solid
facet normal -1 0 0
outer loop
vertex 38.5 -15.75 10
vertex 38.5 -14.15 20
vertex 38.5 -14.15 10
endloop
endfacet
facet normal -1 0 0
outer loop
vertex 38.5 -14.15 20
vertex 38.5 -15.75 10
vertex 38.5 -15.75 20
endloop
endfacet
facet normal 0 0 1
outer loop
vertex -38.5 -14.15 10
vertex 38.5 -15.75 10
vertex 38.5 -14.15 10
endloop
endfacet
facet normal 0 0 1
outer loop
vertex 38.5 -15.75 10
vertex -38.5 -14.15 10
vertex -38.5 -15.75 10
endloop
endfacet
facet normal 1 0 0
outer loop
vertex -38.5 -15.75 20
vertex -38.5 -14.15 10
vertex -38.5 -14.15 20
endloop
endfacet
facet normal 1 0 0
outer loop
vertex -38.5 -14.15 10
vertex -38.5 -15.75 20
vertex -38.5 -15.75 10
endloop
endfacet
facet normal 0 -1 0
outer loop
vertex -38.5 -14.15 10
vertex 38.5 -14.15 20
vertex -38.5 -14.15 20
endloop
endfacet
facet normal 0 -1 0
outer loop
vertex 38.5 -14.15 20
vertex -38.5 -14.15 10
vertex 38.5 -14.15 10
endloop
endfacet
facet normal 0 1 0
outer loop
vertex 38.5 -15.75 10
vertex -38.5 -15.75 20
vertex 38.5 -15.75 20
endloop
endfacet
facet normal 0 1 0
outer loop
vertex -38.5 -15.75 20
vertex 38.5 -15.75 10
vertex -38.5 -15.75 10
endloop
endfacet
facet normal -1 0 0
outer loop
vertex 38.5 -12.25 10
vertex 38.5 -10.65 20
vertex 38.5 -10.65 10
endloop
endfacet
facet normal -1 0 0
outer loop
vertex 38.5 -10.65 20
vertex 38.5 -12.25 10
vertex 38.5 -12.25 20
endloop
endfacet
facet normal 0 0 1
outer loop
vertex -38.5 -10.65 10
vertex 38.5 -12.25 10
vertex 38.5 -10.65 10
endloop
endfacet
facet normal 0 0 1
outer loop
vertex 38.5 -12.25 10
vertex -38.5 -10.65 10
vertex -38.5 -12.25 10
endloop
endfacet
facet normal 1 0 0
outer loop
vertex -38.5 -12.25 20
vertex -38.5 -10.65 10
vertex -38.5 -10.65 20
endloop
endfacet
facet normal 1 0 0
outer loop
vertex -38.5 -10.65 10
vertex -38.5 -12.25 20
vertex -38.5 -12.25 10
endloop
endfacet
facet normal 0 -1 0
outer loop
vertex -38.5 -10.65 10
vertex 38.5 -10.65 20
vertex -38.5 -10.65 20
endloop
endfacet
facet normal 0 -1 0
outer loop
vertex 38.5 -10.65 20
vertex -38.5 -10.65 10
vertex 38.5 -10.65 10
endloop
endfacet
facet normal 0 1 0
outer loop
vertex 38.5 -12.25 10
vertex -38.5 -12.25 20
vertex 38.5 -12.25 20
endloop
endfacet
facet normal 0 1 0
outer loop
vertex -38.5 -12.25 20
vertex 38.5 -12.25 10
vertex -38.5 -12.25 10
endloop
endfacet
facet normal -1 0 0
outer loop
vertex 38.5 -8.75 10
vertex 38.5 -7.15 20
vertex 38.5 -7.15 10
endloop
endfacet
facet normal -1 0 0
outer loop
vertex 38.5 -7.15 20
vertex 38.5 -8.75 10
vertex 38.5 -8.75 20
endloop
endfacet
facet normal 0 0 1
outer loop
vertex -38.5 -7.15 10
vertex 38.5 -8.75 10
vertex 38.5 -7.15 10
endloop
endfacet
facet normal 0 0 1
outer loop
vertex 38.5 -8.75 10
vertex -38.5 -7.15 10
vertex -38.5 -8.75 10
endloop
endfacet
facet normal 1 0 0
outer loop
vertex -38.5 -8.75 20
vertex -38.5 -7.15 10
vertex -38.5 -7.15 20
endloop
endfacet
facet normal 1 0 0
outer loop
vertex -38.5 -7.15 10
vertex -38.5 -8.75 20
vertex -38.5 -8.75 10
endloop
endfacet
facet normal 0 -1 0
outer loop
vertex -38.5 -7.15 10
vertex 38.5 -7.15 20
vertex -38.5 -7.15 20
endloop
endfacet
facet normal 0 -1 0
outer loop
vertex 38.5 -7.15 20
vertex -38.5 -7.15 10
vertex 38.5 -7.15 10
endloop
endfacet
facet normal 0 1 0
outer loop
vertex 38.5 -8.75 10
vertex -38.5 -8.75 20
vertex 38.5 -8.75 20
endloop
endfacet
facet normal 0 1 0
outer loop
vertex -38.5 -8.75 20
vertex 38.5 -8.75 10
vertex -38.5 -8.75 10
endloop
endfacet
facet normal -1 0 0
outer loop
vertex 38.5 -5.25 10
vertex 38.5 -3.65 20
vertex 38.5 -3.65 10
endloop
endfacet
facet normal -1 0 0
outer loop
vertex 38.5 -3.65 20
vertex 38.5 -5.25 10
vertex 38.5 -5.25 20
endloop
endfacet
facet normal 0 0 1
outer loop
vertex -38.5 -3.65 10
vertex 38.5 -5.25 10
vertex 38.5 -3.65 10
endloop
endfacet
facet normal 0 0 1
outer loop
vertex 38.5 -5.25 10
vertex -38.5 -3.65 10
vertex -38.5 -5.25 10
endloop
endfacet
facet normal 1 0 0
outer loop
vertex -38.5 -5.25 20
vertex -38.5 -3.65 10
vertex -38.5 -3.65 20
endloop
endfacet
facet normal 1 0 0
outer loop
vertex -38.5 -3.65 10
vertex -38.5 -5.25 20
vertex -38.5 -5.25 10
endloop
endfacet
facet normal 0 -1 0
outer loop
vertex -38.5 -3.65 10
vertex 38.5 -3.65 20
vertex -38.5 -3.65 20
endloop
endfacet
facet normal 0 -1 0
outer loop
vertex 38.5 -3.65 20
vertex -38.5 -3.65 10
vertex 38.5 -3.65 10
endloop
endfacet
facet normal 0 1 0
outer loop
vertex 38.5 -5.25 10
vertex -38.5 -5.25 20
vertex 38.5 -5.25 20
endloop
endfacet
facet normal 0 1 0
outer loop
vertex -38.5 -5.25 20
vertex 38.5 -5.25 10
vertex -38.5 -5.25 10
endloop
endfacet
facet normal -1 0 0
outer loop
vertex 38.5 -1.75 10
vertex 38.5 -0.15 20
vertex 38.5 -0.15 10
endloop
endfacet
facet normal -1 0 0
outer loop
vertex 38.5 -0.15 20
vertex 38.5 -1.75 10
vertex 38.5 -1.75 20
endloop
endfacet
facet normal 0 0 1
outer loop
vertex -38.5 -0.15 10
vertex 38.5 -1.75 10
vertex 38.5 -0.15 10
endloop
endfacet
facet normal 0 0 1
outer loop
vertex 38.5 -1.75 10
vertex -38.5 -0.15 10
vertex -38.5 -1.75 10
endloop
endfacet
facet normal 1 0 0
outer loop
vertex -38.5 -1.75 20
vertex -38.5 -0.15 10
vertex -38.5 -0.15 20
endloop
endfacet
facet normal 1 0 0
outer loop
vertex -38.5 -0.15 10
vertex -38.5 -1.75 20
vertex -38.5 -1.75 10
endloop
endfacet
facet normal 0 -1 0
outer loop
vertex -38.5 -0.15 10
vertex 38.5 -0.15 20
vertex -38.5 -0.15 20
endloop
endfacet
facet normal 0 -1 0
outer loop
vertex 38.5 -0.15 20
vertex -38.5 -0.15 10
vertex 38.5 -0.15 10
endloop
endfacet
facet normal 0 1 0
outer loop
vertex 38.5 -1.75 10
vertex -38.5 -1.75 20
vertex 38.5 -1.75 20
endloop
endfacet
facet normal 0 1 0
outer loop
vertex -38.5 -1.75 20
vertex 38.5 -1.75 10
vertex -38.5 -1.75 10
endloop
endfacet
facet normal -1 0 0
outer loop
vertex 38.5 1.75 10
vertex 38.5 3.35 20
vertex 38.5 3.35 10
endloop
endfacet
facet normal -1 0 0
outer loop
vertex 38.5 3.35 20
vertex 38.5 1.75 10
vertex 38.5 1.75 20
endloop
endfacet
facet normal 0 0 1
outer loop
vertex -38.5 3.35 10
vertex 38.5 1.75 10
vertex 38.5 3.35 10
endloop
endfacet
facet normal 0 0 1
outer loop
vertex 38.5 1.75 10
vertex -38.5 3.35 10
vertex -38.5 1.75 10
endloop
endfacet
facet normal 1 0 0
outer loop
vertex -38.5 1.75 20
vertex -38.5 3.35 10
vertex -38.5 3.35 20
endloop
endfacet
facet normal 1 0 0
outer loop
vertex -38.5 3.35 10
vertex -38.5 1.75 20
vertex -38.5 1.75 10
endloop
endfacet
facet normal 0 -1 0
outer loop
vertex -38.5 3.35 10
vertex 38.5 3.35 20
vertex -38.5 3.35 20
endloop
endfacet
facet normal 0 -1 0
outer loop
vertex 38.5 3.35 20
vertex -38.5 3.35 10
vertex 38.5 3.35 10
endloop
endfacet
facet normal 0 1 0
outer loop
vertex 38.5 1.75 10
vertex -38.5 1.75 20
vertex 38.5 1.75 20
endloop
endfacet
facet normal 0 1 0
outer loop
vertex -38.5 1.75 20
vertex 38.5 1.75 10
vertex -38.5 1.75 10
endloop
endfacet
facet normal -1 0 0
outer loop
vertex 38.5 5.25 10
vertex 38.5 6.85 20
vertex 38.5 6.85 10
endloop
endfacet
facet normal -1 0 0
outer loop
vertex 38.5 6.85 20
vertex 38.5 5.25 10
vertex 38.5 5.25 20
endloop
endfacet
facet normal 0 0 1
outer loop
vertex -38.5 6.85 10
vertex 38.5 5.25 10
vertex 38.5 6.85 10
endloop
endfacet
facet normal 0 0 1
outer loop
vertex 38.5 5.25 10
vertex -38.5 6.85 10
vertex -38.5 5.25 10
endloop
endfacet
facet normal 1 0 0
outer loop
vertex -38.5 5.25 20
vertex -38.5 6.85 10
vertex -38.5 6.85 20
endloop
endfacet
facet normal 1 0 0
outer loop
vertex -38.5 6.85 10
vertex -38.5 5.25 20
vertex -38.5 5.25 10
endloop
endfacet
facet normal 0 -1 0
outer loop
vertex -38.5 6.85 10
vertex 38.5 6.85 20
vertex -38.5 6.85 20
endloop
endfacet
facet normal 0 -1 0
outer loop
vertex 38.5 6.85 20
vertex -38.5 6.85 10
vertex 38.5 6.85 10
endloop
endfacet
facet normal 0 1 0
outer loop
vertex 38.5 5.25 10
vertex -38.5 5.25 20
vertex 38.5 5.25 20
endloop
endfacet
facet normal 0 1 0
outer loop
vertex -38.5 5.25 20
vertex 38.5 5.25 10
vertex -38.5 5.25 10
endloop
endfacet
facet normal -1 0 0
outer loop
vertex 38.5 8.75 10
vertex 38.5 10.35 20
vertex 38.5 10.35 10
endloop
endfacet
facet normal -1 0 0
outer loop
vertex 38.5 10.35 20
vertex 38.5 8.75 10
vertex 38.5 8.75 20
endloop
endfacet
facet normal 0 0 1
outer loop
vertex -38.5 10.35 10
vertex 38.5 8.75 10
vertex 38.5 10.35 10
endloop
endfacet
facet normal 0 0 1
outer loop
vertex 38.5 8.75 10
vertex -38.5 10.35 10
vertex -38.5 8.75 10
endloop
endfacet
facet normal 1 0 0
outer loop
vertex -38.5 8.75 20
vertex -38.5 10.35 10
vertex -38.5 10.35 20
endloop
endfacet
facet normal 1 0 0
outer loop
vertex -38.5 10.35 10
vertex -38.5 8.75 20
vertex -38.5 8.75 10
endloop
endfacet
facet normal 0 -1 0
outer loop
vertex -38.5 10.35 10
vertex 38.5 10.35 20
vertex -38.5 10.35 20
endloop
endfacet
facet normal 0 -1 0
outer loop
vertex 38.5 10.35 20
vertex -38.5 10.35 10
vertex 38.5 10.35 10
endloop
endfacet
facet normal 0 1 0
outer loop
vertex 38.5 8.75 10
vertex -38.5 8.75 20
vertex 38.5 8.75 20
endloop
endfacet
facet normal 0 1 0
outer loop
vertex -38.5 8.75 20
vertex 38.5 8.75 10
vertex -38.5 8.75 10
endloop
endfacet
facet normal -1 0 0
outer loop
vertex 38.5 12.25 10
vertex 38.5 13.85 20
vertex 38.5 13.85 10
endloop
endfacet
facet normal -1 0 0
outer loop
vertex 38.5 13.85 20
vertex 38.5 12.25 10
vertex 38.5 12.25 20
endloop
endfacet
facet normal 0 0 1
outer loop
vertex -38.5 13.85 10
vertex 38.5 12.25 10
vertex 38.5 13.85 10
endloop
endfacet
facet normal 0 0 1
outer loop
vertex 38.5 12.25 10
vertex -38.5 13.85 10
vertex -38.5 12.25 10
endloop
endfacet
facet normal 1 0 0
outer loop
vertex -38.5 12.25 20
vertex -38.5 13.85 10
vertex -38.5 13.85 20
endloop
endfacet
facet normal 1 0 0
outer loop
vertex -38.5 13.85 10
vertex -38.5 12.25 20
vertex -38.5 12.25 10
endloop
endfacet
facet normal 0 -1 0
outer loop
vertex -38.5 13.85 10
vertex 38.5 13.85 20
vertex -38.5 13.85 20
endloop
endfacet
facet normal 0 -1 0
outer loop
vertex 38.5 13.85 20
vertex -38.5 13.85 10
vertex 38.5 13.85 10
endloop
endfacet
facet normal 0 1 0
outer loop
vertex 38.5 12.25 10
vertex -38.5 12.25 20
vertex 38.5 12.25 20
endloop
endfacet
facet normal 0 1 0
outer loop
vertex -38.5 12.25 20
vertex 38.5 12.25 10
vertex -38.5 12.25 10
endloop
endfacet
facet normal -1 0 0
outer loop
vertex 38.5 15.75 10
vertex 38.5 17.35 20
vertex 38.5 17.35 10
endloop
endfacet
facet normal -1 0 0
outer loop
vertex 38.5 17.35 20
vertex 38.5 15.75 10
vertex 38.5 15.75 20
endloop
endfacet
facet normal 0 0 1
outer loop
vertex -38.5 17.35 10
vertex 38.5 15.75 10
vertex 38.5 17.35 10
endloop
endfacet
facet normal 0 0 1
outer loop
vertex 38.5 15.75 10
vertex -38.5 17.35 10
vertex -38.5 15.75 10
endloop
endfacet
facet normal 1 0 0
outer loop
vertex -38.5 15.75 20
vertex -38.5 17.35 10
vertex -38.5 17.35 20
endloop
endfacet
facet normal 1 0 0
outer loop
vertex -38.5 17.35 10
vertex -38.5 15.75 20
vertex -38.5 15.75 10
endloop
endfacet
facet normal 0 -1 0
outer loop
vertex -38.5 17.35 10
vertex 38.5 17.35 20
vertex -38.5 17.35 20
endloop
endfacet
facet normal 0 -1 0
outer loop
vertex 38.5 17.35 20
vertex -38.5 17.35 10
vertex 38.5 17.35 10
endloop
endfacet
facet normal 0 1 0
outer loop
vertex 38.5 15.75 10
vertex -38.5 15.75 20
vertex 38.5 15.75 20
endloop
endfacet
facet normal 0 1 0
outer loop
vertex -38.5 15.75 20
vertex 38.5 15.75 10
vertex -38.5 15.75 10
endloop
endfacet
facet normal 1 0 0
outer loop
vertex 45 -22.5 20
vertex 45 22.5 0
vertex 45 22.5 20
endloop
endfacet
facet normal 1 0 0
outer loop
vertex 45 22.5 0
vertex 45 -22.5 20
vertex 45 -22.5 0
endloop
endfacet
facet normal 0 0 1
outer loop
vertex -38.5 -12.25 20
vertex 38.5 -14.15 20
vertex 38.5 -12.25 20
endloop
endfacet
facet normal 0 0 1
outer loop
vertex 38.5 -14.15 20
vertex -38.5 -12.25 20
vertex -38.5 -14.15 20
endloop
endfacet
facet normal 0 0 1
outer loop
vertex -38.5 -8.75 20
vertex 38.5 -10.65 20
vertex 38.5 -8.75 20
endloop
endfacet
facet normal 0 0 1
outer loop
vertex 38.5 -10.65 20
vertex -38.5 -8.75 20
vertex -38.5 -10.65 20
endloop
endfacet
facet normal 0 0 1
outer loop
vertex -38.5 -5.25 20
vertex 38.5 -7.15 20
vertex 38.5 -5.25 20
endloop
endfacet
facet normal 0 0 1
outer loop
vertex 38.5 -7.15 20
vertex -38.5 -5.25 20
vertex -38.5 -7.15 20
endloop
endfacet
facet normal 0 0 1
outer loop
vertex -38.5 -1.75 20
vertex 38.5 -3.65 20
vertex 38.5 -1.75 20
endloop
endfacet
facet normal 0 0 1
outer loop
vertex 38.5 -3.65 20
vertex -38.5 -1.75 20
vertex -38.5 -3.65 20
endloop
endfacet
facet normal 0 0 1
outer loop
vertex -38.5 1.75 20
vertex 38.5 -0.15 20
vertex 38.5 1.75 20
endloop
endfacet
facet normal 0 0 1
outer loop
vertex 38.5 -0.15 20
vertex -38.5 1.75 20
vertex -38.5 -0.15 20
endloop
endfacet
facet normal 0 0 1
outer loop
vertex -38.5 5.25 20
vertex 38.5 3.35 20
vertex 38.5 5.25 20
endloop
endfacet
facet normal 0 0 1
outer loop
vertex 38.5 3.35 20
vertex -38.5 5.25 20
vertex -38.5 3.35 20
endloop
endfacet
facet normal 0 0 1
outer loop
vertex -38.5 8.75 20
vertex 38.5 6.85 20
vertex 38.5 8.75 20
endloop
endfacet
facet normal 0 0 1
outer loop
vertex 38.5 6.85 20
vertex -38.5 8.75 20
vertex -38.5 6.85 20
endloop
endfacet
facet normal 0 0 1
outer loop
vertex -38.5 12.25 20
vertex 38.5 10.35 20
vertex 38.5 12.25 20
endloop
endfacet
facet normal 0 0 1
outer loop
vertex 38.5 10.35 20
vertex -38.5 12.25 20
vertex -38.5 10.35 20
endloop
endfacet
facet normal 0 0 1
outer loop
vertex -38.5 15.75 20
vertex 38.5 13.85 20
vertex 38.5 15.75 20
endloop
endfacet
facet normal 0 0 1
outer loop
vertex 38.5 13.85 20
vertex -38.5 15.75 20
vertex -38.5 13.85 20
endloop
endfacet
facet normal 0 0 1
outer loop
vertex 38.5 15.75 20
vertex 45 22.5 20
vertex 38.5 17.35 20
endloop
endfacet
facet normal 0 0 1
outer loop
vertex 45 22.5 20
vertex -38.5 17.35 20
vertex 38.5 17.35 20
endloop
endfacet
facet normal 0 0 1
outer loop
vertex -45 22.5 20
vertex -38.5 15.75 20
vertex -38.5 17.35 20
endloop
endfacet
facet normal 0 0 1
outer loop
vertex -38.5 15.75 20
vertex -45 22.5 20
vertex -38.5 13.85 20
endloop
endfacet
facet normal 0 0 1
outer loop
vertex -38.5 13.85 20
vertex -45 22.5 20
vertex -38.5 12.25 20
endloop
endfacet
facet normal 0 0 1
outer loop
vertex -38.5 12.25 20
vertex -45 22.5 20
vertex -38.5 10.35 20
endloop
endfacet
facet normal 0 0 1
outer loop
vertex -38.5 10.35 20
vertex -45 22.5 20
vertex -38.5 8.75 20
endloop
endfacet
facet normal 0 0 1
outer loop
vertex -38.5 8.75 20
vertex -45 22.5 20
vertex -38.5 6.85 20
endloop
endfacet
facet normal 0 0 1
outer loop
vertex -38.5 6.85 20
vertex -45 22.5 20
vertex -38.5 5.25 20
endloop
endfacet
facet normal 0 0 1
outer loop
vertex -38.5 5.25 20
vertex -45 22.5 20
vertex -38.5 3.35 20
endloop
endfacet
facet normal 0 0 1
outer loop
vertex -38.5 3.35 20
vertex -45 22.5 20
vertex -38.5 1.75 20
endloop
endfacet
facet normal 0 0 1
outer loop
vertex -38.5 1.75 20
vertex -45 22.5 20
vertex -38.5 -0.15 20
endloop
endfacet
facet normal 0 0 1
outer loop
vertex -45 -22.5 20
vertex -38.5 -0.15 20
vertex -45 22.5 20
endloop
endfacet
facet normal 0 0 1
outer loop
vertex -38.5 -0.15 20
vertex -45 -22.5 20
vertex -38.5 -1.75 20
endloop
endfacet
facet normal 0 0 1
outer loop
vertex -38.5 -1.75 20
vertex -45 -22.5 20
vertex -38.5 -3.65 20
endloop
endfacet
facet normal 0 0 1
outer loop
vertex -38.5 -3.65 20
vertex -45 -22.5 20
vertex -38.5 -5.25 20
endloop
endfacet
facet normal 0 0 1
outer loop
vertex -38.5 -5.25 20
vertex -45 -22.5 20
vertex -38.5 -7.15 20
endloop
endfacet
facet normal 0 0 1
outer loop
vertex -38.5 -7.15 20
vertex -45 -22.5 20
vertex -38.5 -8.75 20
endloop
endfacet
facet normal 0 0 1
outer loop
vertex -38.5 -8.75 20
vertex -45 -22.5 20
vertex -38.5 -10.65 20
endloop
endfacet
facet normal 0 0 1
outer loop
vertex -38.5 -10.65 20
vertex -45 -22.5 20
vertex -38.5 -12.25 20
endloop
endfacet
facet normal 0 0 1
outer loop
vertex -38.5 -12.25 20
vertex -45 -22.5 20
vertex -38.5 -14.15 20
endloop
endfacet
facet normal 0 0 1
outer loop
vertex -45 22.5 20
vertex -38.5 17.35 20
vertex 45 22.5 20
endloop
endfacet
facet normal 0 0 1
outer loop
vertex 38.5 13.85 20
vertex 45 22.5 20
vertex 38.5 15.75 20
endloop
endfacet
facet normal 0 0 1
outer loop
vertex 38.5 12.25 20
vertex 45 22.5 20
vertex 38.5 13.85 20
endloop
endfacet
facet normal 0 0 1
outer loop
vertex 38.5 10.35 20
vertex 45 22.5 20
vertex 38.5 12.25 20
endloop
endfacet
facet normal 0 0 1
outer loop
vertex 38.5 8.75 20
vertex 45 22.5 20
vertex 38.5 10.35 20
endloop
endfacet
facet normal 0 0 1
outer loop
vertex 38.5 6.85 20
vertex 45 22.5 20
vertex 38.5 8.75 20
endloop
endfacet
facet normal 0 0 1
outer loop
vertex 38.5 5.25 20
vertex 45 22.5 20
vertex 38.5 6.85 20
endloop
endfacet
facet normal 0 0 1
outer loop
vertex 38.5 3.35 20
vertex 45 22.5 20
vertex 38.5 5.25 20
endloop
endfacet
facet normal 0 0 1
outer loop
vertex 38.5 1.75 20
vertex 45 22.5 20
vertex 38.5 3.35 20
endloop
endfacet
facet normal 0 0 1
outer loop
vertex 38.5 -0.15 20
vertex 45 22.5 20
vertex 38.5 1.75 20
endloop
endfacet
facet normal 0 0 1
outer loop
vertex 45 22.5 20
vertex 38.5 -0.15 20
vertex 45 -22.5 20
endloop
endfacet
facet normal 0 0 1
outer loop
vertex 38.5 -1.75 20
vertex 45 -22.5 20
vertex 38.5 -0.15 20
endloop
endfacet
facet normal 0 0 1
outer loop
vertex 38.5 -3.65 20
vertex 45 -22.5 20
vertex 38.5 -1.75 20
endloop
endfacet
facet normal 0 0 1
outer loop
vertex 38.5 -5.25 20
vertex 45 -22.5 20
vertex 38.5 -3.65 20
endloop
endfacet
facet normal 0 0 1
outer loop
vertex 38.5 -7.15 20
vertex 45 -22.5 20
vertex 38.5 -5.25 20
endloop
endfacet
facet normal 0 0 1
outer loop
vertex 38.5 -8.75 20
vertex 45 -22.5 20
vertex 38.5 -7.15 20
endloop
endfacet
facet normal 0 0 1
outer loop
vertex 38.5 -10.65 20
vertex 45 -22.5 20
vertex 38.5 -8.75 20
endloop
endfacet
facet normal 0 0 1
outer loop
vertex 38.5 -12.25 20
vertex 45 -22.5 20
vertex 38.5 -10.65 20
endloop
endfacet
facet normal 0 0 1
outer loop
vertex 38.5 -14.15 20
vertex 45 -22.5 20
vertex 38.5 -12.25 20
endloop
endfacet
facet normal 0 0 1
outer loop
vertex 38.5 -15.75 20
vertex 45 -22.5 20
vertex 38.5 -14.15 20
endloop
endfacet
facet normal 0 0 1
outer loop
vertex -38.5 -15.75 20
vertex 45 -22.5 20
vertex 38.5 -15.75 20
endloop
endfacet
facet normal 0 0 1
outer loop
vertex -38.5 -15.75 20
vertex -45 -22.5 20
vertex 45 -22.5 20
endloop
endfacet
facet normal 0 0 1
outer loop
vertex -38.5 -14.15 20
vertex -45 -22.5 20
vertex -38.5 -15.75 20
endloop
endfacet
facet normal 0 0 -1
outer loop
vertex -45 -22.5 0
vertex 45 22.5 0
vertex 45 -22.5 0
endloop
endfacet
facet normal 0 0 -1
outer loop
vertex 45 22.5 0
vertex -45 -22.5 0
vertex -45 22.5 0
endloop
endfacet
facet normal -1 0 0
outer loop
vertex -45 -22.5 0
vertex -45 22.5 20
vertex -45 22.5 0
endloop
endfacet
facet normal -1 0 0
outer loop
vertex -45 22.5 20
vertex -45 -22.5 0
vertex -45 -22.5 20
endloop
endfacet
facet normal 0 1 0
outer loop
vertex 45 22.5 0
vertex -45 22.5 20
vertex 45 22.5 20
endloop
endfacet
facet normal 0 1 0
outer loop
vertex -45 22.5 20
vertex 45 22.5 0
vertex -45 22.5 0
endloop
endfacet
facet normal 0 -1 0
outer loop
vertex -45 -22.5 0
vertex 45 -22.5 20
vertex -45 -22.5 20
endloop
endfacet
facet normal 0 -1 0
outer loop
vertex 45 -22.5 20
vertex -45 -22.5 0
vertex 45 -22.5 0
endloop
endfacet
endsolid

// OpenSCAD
// Microscope slide drying rack
// Print orientation: base block flat on bed, slots open at top

// ---------- Parameters ----------
block_len    = 90;   // block length along X (mm)
block_wid    = 45;   // block width along Y (mm)
block_h      = 20;   // block height along Z (mm)

slot_count   = 10;   // number of slide slots
slot_len     = 77;   // slot length along X (mm)
slot_w       = 1.6;  // slot width along Y (mm)
slot_depth   = 10;   // slot depth from top face (mm)
slot_pitch   = 3.5;  // centre-to-centre slot spacing along Y (mm)

eps          = 0.5;  // overshoot for clean boolean cuts (mm)

$fn = 64;

// ---------- Model ----------
difference() {
    // Base block, centred in X/Y, resting on z = 0
    translate([-block_len/2, -block_wid/2, 0])
        cube([block_len, block_wid, block_h]);

    // Slot group, centred on block in X/Y
    for (i = [0 : slot_count - 1]) {
        y = (i - (slot_count - 1)/2) * slot_pitch;
        translate([-slot_len/2, y, block_h - slot_depth])
            cube([slot_len, slot_w, slot_depth + eps]);
    }
}
